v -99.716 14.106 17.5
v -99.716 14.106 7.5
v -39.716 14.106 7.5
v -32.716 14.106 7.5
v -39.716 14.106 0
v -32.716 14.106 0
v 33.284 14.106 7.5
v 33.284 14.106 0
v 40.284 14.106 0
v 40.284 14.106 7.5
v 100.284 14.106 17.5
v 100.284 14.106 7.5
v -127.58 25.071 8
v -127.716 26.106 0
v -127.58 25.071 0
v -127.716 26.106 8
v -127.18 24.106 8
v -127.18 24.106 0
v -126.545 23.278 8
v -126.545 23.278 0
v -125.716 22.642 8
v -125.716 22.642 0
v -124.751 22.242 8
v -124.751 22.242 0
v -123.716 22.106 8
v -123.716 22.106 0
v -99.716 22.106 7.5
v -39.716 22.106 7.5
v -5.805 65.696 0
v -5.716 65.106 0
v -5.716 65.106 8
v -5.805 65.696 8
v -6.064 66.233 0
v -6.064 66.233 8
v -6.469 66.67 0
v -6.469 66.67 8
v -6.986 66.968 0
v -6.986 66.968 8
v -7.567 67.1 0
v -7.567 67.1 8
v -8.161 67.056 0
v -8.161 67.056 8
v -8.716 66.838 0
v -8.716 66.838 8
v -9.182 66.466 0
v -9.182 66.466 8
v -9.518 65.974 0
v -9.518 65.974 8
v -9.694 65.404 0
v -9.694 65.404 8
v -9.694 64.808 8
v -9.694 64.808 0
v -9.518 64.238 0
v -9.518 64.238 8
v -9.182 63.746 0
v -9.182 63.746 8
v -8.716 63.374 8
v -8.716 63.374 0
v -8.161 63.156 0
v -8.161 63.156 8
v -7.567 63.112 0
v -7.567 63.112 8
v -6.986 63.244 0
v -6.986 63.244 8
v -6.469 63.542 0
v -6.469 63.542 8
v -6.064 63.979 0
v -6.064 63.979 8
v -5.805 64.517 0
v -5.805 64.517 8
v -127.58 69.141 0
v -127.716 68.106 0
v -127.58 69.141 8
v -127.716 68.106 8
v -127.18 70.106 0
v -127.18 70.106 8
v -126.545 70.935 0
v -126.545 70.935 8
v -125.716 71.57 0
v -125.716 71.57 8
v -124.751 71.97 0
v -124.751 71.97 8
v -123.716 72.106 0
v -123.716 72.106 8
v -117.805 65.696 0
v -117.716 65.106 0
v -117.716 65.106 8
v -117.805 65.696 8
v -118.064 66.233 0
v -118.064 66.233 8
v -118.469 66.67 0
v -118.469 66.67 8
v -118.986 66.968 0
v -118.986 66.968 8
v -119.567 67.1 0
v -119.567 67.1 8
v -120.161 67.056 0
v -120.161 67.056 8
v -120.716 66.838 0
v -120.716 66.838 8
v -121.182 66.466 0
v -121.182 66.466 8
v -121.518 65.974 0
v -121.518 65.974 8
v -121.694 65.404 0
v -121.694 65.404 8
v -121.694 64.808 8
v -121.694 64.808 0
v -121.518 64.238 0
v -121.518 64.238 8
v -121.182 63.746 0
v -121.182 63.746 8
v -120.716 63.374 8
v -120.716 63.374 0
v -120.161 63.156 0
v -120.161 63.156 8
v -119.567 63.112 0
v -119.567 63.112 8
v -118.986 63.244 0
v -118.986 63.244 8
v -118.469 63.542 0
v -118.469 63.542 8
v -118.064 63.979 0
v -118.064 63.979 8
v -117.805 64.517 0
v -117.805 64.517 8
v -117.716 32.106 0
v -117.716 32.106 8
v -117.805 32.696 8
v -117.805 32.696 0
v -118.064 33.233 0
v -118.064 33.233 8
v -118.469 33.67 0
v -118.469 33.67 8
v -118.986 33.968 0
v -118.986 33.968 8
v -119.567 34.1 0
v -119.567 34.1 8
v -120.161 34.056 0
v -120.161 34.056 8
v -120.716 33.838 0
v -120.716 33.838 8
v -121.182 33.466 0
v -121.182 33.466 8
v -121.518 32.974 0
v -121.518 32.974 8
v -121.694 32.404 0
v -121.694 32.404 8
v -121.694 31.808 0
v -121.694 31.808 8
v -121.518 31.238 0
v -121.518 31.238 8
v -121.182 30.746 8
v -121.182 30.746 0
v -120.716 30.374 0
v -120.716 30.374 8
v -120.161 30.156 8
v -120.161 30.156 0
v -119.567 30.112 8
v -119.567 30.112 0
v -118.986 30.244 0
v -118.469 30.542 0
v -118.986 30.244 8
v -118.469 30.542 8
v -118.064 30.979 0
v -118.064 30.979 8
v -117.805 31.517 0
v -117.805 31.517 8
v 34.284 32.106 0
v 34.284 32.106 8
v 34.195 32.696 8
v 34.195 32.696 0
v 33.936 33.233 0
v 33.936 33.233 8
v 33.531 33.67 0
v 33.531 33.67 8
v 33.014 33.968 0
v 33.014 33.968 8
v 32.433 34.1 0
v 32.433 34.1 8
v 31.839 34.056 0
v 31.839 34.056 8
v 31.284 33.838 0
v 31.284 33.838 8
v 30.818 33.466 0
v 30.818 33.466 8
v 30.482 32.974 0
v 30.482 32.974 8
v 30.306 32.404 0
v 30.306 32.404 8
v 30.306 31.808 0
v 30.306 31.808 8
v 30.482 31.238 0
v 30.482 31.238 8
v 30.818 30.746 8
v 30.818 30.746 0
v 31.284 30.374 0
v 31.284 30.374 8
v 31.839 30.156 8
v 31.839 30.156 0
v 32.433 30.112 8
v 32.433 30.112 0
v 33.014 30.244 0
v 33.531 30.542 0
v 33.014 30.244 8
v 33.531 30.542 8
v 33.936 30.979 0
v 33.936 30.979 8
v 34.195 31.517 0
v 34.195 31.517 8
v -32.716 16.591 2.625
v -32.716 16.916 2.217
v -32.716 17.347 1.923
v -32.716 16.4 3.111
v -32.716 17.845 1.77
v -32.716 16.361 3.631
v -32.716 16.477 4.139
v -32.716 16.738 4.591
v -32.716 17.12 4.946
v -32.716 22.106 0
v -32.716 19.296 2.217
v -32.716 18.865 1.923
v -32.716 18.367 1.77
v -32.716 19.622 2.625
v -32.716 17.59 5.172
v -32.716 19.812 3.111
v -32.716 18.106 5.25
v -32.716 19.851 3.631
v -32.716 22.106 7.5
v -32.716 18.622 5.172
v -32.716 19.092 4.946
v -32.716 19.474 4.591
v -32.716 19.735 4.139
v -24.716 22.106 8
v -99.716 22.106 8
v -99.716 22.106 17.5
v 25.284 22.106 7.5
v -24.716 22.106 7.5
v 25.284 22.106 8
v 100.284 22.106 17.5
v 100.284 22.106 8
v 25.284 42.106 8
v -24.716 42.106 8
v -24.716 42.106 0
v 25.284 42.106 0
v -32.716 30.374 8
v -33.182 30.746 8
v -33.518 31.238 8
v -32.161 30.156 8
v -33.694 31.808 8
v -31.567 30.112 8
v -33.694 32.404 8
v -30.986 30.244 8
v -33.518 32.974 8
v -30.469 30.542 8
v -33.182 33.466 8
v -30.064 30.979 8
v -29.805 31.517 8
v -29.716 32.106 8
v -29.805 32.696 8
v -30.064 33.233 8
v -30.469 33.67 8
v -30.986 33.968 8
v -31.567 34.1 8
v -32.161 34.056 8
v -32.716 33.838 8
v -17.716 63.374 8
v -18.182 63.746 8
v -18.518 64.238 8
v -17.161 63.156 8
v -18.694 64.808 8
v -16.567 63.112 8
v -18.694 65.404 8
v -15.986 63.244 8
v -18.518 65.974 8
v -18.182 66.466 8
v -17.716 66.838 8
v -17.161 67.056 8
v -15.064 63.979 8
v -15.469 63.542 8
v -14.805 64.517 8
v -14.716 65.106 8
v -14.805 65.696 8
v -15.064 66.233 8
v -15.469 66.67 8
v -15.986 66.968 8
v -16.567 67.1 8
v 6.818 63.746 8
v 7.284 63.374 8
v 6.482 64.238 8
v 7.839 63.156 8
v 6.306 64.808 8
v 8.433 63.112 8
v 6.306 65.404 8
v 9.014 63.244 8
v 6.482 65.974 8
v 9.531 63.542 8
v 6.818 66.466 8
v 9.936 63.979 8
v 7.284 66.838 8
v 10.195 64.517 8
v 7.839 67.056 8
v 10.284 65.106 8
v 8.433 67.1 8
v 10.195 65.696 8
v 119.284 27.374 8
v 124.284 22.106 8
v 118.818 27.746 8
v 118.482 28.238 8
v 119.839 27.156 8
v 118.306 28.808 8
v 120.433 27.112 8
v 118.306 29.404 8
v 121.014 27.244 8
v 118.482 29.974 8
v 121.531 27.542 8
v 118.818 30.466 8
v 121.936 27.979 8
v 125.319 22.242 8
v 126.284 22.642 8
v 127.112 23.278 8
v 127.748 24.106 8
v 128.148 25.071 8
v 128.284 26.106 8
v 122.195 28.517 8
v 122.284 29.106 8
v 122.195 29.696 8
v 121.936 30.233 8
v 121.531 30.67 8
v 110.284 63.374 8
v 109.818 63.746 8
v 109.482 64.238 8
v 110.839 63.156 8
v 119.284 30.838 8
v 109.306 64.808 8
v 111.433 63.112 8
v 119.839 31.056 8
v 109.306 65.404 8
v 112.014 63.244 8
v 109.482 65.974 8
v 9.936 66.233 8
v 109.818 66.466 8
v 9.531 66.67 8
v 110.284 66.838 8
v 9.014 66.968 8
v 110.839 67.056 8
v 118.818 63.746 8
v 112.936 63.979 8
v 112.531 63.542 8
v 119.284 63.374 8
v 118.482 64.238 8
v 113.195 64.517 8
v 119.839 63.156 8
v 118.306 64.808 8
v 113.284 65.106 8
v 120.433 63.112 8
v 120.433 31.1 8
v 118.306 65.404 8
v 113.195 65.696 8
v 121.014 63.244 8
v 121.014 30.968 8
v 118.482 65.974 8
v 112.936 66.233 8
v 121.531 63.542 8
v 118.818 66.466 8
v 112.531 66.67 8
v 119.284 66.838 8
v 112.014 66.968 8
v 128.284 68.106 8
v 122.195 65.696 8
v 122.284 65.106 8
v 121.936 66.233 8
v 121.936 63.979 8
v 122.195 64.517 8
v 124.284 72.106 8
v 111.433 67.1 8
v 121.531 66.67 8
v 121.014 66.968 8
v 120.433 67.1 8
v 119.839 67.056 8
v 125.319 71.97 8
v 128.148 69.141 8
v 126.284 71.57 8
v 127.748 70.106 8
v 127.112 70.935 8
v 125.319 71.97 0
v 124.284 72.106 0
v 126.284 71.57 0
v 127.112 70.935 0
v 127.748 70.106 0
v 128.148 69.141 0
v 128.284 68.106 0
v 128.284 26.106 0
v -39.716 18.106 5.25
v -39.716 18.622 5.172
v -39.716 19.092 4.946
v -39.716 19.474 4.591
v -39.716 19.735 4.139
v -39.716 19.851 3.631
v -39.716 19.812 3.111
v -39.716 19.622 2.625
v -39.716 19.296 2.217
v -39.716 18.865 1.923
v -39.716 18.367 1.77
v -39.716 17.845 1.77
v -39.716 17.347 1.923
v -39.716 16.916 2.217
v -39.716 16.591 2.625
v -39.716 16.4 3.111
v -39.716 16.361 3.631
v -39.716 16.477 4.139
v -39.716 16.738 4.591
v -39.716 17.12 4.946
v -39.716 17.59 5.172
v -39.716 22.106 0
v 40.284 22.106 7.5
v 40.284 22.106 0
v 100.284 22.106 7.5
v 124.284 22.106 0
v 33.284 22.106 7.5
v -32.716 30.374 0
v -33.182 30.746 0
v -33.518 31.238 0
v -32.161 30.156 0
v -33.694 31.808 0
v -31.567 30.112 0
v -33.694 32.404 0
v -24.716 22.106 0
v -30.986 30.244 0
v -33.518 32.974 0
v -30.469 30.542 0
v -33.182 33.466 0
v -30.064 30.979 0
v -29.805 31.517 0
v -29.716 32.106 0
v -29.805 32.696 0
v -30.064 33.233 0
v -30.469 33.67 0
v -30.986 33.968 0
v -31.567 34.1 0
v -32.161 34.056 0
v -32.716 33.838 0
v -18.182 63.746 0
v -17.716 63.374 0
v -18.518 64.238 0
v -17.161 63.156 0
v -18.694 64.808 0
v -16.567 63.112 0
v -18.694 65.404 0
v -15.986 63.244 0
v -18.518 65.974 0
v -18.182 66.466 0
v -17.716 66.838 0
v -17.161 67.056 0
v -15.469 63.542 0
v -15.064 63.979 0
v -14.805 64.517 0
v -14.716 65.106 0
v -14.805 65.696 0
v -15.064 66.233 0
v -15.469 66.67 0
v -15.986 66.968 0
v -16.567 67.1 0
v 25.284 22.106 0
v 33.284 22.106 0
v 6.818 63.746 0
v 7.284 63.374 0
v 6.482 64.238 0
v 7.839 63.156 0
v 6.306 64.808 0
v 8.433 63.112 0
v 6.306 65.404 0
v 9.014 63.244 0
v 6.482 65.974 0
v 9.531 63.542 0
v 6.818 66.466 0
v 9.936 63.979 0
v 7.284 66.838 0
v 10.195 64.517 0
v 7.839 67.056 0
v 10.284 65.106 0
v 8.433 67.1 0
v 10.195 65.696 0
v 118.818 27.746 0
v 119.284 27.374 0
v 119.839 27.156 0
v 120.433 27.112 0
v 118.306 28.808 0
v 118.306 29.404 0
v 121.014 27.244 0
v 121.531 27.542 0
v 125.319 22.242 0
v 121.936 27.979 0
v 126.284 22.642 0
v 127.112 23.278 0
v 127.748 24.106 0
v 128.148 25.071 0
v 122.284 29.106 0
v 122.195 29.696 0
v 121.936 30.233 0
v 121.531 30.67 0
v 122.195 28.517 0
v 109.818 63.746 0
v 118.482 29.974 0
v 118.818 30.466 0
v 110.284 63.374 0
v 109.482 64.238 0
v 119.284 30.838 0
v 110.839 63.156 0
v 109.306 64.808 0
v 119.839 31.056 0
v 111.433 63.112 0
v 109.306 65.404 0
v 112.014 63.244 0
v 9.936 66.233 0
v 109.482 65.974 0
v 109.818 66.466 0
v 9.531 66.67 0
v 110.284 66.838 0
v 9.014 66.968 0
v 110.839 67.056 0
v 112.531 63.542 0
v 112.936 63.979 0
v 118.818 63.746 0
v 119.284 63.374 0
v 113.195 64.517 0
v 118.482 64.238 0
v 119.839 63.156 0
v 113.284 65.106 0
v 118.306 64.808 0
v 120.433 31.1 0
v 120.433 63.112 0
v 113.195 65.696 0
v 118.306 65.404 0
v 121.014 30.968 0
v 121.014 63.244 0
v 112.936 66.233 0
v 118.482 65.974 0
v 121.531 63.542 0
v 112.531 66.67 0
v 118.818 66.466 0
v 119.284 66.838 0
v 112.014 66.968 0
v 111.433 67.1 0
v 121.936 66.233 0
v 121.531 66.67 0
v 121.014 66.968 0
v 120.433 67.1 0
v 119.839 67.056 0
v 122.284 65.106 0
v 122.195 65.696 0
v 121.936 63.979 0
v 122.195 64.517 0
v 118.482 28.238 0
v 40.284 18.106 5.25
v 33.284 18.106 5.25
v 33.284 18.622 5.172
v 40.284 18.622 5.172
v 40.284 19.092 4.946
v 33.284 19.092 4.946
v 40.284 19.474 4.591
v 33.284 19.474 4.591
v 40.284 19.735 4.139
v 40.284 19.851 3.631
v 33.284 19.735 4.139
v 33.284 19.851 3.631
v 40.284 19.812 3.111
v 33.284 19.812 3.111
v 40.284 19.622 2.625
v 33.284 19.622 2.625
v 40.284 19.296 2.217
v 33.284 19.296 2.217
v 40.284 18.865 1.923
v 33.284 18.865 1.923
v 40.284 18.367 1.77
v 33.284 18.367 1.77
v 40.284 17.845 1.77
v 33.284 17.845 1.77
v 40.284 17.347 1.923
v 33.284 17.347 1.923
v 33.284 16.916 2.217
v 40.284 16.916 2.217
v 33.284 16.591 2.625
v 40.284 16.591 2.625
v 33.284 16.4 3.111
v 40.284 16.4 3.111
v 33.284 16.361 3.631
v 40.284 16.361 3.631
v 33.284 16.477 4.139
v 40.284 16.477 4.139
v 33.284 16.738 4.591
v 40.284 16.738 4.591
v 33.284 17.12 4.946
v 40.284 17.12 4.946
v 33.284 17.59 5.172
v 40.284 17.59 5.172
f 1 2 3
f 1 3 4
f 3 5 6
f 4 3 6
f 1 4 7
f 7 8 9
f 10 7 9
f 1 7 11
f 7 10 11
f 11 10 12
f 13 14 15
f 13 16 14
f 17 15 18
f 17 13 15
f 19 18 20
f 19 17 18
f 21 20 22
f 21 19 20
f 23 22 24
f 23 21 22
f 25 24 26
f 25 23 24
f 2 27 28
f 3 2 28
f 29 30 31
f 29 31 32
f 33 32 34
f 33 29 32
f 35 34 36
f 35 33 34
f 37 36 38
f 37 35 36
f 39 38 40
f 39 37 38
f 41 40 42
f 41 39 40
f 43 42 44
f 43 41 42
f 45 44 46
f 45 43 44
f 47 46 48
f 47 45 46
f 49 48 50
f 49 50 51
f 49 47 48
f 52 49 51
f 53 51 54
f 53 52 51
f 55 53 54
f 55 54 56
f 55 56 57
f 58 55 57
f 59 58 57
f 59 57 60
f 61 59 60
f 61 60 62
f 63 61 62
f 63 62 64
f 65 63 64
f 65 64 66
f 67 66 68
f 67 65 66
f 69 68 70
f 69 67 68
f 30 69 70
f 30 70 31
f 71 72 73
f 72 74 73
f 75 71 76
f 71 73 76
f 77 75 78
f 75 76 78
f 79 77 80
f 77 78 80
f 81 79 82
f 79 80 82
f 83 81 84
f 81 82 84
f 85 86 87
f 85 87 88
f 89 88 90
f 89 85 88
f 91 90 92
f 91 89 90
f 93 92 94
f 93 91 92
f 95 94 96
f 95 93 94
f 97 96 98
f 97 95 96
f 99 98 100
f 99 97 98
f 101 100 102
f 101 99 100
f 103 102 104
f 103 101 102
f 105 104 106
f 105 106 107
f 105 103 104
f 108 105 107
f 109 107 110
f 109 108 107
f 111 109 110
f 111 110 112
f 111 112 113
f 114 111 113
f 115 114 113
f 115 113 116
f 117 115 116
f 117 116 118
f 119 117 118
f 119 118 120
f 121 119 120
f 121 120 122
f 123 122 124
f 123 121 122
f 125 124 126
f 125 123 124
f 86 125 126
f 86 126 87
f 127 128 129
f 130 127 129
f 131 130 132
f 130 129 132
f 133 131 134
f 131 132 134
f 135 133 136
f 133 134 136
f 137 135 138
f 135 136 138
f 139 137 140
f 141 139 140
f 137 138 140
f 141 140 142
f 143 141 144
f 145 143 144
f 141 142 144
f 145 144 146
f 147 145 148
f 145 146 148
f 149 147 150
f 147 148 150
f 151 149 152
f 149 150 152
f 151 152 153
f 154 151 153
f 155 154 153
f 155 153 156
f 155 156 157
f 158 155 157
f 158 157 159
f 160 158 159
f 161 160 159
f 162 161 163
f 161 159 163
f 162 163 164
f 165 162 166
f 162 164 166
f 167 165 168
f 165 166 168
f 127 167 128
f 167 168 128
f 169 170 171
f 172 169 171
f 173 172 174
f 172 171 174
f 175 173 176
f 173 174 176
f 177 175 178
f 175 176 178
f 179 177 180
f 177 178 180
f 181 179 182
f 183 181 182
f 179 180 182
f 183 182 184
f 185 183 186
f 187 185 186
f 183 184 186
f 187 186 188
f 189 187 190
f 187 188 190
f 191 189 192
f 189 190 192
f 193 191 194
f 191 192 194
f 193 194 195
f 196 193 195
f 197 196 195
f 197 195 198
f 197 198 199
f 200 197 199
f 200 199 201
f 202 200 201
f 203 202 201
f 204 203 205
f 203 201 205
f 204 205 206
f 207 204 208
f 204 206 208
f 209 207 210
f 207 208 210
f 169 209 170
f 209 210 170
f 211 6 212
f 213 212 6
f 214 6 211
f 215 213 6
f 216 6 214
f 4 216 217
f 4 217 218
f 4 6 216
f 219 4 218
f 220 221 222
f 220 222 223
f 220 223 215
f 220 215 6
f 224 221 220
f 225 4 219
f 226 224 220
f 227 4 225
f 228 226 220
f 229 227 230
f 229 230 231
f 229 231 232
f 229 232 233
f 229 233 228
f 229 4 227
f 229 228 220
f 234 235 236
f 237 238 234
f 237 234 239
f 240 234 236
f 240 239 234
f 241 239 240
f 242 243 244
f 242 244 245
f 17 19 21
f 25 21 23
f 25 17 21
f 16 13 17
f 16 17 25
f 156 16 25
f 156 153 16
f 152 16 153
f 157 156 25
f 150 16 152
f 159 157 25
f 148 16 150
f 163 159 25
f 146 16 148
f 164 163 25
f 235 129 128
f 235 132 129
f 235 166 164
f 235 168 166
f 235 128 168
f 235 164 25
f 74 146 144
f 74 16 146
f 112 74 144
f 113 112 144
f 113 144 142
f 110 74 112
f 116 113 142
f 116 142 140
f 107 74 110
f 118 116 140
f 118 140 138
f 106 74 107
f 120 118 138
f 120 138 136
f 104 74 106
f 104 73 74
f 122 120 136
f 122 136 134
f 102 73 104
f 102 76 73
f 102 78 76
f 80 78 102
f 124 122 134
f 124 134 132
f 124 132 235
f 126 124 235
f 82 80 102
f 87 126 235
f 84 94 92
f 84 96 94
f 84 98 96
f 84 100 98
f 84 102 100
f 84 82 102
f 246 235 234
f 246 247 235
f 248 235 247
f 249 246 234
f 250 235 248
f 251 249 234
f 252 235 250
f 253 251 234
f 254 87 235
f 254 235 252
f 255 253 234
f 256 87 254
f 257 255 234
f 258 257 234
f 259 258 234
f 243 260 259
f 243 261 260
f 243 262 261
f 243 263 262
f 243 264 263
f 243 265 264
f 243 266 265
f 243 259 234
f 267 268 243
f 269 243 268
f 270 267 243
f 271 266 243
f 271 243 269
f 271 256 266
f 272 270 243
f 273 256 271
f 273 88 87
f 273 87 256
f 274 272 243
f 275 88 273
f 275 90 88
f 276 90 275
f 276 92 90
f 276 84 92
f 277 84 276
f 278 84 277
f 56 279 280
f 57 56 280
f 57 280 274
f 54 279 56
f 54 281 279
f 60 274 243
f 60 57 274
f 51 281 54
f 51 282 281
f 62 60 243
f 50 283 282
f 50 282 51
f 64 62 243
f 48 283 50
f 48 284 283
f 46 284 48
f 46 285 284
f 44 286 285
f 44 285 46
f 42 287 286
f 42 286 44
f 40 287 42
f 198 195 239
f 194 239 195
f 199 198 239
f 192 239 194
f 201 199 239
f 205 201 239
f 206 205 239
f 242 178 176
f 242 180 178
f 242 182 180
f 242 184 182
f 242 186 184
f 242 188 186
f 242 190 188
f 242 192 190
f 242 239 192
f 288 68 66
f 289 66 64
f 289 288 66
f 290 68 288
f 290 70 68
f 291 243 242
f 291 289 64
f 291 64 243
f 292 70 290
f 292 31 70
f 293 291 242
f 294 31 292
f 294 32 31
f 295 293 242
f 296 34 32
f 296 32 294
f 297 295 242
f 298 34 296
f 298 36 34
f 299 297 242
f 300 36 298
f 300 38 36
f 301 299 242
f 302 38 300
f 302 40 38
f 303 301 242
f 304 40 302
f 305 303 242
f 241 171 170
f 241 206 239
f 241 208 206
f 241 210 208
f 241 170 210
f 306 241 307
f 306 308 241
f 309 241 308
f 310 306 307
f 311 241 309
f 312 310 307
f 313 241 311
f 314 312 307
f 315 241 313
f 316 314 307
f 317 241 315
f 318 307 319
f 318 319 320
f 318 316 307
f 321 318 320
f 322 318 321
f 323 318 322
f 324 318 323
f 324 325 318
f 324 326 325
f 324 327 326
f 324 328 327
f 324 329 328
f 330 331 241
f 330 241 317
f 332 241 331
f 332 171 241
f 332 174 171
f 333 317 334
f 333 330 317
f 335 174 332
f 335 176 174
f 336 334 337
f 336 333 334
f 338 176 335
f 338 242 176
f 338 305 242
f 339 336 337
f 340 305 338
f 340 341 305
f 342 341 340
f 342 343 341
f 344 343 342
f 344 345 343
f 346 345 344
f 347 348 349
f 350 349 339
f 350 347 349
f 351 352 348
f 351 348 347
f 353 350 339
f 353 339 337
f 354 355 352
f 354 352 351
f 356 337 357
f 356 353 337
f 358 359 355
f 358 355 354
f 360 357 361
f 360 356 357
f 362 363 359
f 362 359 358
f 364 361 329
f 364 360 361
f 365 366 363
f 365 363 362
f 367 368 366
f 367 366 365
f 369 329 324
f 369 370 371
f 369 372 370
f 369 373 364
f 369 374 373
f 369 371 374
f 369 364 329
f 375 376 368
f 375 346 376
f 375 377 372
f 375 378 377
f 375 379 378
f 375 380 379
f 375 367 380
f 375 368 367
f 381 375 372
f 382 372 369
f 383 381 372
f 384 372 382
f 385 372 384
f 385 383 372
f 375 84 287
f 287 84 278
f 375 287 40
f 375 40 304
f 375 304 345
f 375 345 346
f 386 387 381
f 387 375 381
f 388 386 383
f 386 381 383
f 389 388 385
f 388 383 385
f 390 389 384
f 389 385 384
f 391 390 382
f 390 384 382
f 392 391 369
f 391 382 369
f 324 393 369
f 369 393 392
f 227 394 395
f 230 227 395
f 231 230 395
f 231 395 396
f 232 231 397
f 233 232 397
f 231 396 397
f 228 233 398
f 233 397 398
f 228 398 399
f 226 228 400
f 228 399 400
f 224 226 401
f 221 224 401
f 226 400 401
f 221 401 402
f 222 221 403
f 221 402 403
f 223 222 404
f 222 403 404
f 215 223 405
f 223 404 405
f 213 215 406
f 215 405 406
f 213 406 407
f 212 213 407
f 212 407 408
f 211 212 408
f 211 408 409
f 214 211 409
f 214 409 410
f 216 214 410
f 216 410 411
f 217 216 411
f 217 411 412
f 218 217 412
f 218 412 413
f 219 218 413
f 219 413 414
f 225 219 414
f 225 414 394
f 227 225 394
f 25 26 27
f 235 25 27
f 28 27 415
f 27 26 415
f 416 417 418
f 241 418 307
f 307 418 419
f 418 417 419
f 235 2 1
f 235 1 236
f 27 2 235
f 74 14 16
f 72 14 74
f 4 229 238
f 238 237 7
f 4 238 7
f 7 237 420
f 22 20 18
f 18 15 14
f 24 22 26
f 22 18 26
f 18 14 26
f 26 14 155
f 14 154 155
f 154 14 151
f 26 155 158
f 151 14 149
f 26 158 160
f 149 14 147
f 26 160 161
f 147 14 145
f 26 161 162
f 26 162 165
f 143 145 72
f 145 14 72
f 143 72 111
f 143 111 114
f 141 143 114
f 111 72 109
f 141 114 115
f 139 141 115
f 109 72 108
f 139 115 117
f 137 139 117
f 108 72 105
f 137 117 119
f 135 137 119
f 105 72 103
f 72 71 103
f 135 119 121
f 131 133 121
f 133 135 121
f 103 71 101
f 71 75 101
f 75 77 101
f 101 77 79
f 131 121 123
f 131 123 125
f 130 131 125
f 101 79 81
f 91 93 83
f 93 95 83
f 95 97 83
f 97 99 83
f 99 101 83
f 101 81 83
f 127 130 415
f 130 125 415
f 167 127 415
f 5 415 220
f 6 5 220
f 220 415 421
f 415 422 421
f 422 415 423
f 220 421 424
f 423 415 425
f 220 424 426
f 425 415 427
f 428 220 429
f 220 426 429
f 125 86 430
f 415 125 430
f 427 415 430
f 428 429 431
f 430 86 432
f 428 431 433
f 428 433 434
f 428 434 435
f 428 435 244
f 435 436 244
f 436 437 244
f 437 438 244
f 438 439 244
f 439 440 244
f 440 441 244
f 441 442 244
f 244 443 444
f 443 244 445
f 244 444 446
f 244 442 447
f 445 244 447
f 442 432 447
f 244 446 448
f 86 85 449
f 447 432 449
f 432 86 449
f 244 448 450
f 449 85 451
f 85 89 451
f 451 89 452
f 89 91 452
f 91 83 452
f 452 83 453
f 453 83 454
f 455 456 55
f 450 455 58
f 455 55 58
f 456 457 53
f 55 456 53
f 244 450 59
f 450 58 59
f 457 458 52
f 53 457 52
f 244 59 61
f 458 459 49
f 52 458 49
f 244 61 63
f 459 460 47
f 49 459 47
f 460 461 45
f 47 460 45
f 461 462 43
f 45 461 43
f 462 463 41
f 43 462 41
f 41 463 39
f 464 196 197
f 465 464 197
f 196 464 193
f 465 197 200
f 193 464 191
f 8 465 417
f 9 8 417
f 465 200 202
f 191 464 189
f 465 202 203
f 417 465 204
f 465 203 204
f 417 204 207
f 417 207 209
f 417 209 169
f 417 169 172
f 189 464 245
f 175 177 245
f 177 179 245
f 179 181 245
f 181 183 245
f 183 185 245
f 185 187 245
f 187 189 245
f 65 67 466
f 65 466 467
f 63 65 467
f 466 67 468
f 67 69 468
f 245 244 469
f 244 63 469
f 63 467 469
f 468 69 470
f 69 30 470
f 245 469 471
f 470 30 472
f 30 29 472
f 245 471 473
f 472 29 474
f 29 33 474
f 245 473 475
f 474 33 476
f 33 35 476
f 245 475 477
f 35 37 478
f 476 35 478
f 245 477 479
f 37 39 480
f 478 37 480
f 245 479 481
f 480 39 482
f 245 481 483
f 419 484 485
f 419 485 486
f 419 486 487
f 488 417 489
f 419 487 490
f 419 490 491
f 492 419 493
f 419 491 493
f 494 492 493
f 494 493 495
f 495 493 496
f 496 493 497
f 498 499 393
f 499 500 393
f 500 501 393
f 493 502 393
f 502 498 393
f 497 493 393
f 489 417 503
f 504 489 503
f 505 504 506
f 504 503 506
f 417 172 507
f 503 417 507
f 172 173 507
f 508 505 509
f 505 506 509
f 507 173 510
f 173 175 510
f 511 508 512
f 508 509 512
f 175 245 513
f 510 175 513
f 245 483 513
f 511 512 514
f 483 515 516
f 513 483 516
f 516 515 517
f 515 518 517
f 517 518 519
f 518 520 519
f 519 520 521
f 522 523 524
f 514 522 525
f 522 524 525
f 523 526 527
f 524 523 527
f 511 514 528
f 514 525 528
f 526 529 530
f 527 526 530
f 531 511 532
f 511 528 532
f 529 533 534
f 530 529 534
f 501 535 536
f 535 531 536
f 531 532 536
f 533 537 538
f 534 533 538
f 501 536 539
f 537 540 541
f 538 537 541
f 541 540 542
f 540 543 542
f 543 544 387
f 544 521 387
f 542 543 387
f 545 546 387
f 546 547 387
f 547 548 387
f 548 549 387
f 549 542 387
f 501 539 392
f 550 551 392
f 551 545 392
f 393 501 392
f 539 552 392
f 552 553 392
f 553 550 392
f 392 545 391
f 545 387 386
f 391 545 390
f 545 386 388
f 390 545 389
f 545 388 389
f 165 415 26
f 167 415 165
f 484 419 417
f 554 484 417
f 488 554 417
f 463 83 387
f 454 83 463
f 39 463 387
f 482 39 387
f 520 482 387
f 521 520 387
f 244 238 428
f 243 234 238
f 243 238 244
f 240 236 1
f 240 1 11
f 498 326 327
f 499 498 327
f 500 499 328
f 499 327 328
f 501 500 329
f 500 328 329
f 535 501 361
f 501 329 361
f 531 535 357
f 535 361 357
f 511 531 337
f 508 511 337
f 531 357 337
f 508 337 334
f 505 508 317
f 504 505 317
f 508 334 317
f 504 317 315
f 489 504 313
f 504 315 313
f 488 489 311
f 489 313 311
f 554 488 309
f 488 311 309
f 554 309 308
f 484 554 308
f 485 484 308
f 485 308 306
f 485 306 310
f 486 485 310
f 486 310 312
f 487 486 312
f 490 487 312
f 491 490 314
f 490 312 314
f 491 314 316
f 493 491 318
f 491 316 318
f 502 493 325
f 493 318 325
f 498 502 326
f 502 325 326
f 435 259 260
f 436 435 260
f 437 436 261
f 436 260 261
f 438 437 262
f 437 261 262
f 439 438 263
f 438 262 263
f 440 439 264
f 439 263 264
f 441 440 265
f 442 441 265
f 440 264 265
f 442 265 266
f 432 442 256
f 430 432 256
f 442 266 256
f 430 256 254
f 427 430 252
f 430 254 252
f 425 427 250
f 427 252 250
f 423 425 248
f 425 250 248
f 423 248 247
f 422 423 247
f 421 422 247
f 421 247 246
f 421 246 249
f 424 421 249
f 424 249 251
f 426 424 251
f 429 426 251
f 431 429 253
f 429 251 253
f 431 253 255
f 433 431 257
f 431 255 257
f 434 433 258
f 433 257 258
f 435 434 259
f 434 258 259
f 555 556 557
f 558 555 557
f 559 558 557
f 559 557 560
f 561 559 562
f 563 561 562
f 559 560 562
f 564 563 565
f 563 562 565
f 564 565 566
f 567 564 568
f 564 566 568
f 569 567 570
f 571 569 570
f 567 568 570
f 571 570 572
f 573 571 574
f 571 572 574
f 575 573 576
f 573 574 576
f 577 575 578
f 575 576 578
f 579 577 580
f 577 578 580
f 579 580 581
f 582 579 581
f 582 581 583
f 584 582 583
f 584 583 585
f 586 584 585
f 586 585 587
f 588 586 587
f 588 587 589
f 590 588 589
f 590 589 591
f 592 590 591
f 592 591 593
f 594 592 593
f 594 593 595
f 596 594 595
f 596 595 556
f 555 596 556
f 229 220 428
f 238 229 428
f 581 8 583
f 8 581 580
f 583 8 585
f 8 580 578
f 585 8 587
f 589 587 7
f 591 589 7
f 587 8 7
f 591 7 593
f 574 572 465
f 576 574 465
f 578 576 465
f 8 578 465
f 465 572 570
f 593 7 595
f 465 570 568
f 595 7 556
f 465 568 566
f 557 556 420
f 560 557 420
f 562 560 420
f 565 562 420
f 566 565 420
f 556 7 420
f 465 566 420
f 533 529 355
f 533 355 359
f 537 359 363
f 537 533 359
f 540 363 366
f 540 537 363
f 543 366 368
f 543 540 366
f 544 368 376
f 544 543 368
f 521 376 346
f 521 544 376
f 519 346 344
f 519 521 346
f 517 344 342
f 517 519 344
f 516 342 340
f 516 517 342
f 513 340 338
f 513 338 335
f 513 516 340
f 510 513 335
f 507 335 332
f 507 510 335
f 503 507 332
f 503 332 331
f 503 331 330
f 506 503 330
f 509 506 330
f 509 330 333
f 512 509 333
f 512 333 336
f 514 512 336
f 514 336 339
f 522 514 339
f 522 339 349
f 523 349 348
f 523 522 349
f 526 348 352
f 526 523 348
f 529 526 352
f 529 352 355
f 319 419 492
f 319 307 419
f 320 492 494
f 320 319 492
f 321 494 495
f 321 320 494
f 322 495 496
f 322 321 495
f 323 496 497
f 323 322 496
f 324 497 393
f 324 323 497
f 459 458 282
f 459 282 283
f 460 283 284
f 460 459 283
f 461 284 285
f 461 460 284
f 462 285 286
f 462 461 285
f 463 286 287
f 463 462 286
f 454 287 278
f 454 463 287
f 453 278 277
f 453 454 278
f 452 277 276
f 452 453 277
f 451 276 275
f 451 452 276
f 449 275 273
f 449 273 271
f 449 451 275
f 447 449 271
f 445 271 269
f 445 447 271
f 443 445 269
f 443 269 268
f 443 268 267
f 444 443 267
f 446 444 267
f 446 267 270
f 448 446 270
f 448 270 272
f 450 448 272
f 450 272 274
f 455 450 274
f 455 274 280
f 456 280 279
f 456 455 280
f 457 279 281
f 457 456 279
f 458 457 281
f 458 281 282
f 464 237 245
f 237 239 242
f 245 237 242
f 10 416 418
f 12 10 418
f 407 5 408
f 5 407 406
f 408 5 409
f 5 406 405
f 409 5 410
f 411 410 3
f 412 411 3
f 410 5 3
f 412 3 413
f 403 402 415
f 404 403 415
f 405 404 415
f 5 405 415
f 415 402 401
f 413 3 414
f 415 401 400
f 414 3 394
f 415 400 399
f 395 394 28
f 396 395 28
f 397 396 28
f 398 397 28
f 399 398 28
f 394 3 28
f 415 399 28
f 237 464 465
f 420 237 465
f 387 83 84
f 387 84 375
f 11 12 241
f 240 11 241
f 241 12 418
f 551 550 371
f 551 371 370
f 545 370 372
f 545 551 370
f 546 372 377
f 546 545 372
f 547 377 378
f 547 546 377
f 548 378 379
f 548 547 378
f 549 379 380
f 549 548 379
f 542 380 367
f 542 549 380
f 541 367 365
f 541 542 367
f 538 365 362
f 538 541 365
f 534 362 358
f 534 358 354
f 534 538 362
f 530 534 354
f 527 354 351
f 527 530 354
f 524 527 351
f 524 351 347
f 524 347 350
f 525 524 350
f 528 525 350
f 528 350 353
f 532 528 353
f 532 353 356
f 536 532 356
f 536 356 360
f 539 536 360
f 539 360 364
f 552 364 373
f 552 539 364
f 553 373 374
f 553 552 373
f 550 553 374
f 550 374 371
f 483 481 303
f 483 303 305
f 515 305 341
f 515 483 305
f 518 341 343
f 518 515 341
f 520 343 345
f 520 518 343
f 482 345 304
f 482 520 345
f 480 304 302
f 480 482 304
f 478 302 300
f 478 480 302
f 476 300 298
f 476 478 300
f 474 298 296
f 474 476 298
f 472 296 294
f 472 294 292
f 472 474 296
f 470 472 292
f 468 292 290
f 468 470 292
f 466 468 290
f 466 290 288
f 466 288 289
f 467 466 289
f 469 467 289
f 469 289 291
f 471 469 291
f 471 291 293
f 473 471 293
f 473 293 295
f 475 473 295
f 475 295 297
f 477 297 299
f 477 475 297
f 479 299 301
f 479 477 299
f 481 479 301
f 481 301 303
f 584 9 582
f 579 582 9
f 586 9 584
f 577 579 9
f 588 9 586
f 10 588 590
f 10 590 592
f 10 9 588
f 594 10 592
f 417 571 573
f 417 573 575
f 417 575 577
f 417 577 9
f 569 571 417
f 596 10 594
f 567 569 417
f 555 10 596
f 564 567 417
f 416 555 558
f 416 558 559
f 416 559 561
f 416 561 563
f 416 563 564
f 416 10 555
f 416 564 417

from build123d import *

# Parameters (mm, degrees)
SKETCH1_W            = 256
SKETCH1_H            = 50
SKETCH1_R            = 2
BOSS_EXTRUDE1_DEPTH  = 8
FILLET1_R            = 4
SKETCH2_W            = 7
SKETCH2_H            = 8
BOSS_EXTRUDE2_DEPTH  = 8
SKETCH3_W            = 50
SKETCH3_H            = 20
CUT_EXTRUDE1_DEPTH   = 8
SKETCH4_R            = 2
CUT_EXTRUDE2_DEPTH   = 8
SKETCH5_R            = 1.75
CUT_EXTRUDE3_DEPTH   = 113
BOSS_EXTRUDE12_START = 7.5
SKETCH8_W            = 200
SKETCH8_H            = 8
BOSS_EXTRUDE12_DEPTH = 10


with BuildPart() as part:
    # Sketch1 → Boss-Extrude1 (new body)
    with BuildSketch(Plane.XY):
        with Locations((0.283809042, 47.106089777)):
            Rectangle(SKETCH1_W, SKETCH1_H)
        with Locations((120.283809042, 65.106089777)):
            Circle(SKETCH1_R, mode=Mode.SUBTRACT)
        with Locations((111.283809042, 65.106089777)):
            Circle(SKETCH1_R, mode=Mode.SUBTRACT)
        with Locations((8.283809042, 65.106089777)):
            Circle(SKETCH1_R, mode=Mode.SUBTRACT)
        with Locations((-7.716190958, 65.106089777)):
            Circle(SKETCH1_R, mode=Mode.SUBTRACT)
        with Locations((-16.716190958, 65.106089777)):
            Circle(SKETCH1_R, mode=Mode.SUBTRACT)
        with Locations((-119.716190958, 65.106089777)):
            Circle(SKETCH1_R, mode=Mode.SUBTRACT)
    extrude(amount=BOSS_EXTRUDE1_DEPTH)

    # Fillet1
    fillet1_edges = [part.edges().sort_by_distance(p)[0] for p in [
        (-127.716190958, 72.106089777, 4),
        (128.283809042, 72.106089777, 4),
        (128.283809042, 22.106089777, 4),
        (-127.716190958, 22.106089777, 4),
    ]]
    fillet(fillet1_edges, radius=FILLET1_R)

    # Sketch2 → Boss-Extrude2 (add)
    with BuildSketch(Plane.XY.offset(8)):
        with Locations((36.783809042, 18.106089777)):
            Rectangle(SKETCH2_W, SKETCH2_H)
        with Locations((-36.216190958, 18.106089777)):
            Rectangle(SKETCH2_W, SKETCH2_H)
    extrude(amount=-BOSS_EXTRUDE2_DEPTH)

    # Sketch3 → Cut-Extrude1 (cut)
    with BuildSketch(Plane.XY.offset(8)):
        with Locations((0.283809042, 32.106089777)):
            Rectangle(SKETCH3_W, SKETCH3_H)
    extrude(amount=-CUT_EXTRUDE1_DEPTH, mode=Mode.SUBTRACT)

    # Sketch4 → Cut-Extrude2 (cut)
    with BuildSketch(Plane.XY.offset(8)):
        with Locations((-31.716190958, 32.106089777)):
            Circle(SKETCH4_R)
        with Locations((32.283809042, 32.106089777)):
            Circle(SKETCH4_R)
        with Locations((-119.716190958, 32.106089777)):
            Circle(SKETCH4_R)
        with Locations((120.283809042, 29.106089777)):
            Circle(SKETCH4_R)
    extrude(amount=-CUT_EXTRUDE2_DEPTH, mode=Mode.SUBTRACT)

    # Sketch5 → Cut-Extrude3 (cut)
    with BuildSketch(Plane.ZY.offset(39.716190958)):
        with Locations((3.5, 18.106089777)):
            Circle(SKETCH5_R)
    extrude(amount=-CUT_EXTRUDE3_DEPTH, mode=Mode.SUBTRACT)

    # Sketch8 → Boss-Extrude12 (add)
    with BuildSketch(Plane.XY.offset(BOSS_EXTRUDE12_START)):
        with Locations((0.283809042, 18.106089777)):
            Rectangle(SKETCH8_W, SKETCH8_H)
    extrude(amount=BOSS_EXTRUDE12_DEPTH)


solid = part.part
